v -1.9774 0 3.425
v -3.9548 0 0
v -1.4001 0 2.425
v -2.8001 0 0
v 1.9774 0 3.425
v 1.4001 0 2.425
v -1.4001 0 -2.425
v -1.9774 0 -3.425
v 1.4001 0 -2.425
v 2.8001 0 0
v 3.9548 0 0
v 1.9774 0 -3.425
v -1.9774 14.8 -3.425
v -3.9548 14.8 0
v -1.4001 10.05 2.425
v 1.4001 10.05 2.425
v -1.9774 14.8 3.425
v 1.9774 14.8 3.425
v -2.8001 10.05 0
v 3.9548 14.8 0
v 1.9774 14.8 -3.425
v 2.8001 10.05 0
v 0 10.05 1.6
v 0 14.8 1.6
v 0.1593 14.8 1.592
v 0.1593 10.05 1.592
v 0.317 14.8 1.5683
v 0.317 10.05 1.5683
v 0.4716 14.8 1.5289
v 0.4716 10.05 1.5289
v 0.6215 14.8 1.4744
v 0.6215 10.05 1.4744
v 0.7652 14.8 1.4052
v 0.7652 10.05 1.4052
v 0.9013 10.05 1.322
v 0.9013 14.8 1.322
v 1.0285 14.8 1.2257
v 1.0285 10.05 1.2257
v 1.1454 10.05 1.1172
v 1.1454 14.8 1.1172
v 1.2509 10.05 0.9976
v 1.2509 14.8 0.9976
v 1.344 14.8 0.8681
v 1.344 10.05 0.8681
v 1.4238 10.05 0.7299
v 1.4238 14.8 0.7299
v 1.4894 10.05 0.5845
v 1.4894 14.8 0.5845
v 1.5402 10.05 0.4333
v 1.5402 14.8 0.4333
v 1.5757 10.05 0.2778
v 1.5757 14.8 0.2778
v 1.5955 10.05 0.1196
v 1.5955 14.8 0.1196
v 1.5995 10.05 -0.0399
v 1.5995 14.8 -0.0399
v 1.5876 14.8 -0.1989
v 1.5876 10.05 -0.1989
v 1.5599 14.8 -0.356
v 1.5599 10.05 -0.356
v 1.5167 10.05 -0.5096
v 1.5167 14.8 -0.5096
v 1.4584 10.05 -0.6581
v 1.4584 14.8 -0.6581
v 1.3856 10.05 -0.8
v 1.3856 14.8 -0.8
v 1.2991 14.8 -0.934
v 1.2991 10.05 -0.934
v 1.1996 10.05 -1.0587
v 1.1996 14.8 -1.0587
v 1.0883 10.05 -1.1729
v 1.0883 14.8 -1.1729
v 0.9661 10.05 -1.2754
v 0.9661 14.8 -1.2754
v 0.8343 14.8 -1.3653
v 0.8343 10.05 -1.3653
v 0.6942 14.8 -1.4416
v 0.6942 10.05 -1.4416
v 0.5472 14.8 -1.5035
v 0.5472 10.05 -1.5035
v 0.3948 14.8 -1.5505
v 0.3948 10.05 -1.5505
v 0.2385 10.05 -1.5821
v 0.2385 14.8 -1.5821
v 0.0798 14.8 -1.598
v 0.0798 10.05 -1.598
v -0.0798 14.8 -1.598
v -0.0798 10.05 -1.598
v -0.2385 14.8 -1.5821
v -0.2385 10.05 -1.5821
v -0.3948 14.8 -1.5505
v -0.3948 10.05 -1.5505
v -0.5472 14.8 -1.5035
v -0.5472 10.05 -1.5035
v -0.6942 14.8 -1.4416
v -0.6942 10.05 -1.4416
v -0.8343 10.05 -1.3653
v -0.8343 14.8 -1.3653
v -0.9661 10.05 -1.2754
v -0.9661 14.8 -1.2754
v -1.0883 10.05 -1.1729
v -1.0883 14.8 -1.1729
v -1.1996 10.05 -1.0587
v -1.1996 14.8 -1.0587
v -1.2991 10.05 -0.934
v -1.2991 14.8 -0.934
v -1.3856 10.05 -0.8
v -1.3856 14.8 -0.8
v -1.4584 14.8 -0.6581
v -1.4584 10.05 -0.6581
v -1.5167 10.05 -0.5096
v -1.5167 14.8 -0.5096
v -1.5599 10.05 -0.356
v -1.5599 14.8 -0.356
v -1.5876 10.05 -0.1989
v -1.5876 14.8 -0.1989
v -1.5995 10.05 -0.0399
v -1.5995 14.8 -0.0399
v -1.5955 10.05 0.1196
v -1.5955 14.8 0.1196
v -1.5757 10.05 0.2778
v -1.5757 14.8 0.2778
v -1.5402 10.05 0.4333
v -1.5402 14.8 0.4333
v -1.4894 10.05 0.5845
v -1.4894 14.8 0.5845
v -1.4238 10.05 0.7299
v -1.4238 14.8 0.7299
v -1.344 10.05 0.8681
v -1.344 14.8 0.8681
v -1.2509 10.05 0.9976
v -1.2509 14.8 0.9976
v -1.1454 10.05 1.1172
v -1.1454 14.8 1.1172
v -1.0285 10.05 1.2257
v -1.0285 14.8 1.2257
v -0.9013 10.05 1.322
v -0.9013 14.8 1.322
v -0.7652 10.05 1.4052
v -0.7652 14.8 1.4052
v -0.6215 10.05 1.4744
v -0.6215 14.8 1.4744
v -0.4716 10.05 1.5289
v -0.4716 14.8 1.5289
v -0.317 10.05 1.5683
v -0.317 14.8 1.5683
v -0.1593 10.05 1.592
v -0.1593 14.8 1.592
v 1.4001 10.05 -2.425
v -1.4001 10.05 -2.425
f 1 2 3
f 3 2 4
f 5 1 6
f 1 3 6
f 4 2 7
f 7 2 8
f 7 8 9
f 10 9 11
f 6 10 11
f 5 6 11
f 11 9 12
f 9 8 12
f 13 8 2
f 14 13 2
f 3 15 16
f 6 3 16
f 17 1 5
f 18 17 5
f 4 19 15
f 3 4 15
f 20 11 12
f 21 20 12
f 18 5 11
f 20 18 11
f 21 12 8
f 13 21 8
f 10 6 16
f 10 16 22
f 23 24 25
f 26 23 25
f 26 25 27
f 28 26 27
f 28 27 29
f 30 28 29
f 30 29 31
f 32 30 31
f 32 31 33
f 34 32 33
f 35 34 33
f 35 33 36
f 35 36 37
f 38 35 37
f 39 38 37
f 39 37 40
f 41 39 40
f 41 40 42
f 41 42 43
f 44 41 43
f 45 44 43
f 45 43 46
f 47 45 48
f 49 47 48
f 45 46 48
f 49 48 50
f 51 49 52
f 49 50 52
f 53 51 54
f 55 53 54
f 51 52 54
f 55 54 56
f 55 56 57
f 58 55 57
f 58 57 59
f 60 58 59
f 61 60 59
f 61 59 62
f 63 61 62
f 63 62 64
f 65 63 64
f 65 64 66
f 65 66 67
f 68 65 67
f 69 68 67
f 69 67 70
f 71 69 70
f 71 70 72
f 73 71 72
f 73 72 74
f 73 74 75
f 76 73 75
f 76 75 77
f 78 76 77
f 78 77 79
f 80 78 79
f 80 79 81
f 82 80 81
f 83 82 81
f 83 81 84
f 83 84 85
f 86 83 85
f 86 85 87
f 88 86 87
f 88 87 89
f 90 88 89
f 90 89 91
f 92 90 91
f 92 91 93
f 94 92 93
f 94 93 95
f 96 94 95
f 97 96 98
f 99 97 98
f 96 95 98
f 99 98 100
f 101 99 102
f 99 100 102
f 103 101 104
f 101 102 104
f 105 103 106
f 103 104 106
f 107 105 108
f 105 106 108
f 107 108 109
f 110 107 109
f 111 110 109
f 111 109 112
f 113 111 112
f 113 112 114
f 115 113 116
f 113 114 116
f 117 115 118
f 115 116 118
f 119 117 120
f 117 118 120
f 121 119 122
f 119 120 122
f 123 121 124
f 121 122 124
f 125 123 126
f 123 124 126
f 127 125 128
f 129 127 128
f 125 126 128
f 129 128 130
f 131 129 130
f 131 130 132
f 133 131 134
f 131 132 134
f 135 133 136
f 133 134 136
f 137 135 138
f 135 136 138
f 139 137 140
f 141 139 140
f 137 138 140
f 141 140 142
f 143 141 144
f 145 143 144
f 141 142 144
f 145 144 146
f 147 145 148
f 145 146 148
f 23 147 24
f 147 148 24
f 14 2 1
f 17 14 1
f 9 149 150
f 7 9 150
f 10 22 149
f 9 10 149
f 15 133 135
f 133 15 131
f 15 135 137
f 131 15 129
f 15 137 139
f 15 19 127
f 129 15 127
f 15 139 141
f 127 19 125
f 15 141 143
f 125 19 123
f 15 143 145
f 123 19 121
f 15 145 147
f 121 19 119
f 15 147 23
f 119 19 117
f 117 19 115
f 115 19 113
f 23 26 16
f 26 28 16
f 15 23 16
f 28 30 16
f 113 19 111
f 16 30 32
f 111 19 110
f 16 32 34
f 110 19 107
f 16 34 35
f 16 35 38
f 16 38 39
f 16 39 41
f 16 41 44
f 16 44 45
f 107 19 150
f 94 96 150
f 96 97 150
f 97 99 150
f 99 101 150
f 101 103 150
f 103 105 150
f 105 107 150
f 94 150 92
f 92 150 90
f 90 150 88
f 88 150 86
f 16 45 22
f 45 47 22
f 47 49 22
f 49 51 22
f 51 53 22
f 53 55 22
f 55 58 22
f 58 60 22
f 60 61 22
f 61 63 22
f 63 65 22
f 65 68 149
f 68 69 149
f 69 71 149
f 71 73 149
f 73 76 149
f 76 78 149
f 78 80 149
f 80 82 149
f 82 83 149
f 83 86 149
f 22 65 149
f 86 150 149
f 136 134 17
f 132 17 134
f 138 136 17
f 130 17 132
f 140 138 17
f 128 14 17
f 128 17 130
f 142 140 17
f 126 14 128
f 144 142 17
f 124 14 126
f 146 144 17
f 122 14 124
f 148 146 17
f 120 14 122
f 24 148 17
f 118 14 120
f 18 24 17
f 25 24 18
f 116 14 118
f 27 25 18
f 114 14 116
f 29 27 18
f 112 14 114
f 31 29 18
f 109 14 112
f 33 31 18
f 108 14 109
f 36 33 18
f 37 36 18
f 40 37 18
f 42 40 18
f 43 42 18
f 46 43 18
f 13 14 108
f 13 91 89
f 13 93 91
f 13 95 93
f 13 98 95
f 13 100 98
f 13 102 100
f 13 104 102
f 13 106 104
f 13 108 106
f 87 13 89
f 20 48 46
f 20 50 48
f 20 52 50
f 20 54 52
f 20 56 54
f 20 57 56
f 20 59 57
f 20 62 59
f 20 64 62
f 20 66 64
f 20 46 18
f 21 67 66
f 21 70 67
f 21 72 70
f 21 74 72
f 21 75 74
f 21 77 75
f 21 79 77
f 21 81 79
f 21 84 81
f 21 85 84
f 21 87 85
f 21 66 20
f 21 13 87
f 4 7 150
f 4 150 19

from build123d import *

# Parameters (mm, degrees)
SALIENTE_EXTRUIR1_DEPTH = 14.8
CORTAR_EXTRUIR1_DEPTH   = 10.05
CROQUIS2_R              = 1.6
CORTAR_EXTRUIR2_DEPTH   = 5


with BuildPart() as part:
    # Croquis1 → Saliente-Extruir1 (new body)
    with BuildSketch(Plane(origin=(0, 0, 0), x_dir=(1, 0, 0), z_dir=(0, 1, 0))):
        Polygon((1.977424672, -3.425), (3.954849344, 0), (1.977424672, 3.425), (-1.977424672, 3.425), (-3.954849344, 0), (-1.977424672, -3.425), align=None)
    extrude(amount=SALIENTE_EXTRUIR1_DEPTH)

    # Croquis1<3> → Cortar-Extruir1 (cut)
    with BuildSketch(Plane(origin=(0, 0, 0), x_dir=(1, 0, 0), z_dir=(0, 1, 0))):
        Polygon((-1.400074403, -2.425), (1.400074403, -2.425), (2.800148806, 0), (1.400074403, 2.425), (-1.400074403, 2.425), (-2.800148806, 0), align=None)
    extrude(amount=CORTAR_EXTRUIR1_DEPTH, mode=Mode.SUBTRACT)

    # Croquis2 → Cortar-Extruir2 (cut)
    with BuildSketch(Plane(origin=(0, 14.8, 0), x_dir=(1, 0, 0), z_dir=(0, 1, 0))):
        Circle(CROQUIS2_R)
    extrude(amount=-CORTAR_EXTRUIR2_DEPTH, mode=Mode.SUBTRACT)


solid = part.part
